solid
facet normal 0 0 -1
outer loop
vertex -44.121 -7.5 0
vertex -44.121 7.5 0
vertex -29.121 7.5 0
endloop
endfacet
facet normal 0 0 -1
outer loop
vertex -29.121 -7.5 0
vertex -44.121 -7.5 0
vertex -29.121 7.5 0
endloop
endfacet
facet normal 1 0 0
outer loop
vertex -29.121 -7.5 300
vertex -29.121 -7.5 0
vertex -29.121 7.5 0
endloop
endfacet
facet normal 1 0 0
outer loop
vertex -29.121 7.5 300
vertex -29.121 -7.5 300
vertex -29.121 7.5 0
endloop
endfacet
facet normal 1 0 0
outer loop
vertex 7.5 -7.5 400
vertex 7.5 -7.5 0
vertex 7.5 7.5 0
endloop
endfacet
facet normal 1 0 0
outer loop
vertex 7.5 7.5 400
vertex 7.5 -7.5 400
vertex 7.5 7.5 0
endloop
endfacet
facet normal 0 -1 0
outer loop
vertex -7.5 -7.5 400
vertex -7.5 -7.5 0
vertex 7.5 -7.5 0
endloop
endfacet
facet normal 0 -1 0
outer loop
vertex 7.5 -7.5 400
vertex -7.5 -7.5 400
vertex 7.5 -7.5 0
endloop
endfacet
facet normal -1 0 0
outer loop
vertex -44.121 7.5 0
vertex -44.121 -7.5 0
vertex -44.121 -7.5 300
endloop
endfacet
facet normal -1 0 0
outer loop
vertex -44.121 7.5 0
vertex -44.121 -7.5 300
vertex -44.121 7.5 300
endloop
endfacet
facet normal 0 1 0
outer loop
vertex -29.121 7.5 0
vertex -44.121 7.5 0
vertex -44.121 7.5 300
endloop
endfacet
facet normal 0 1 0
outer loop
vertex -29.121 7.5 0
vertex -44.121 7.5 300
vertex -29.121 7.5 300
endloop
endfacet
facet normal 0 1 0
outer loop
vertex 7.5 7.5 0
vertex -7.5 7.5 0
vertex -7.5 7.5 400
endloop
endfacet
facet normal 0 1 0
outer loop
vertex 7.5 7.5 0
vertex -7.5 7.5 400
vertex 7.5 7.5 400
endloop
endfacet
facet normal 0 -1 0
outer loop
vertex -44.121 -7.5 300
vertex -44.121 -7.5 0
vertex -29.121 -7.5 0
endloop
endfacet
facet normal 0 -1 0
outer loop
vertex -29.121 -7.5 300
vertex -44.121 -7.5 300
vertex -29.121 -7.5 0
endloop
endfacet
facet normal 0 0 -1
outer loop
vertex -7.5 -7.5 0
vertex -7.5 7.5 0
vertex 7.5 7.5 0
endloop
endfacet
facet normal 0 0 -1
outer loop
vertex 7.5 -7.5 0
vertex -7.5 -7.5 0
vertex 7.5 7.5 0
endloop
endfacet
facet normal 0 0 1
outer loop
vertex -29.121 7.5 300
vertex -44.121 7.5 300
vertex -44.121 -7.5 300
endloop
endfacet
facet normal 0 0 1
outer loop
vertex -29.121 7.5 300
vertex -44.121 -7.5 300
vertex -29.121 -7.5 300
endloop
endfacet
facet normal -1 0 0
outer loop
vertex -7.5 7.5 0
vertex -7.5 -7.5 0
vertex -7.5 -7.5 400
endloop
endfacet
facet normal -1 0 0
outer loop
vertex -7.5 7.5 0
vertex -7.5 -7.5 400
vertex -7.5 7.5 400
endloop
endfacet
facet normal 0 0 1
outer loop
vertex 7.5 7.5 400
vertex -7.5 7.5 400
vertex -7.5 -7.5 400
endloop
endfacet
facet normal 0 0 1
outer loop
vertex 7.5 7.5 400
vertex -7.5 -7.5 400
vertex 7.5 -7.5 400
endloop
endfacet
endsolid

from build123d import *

# Parameters (mm, degrees)
F0_W     = 15
F0_H     = 15
F1_DEPTH = 400
F4_W     = 15
F4_H     = 15
F5_DEPTH = 300


with BuildPart() as f1:
    # F0 (on Top) → F1 (new body)
    with BuildSketch(Plane.XY):
        Rectangle(F0_W, F0_H)
    extrude(amount=F1_DEPTH)


with BuildPart() as f2_1:
    # F2: copy of F1
    add(f1.part.moved(Location((-45.974, 0, 0))))


with BuildPart() as f5:
    # F4 (on Top) → F5 (new body)
    with BuildSketch(Plane.XY):
        with Locations((-36.62103, 0)):
            Rectangle(F4_W, F4_H)
    extrude(amount=F5_DEPTH)


solid = Compound([f1.part, f5.part])
